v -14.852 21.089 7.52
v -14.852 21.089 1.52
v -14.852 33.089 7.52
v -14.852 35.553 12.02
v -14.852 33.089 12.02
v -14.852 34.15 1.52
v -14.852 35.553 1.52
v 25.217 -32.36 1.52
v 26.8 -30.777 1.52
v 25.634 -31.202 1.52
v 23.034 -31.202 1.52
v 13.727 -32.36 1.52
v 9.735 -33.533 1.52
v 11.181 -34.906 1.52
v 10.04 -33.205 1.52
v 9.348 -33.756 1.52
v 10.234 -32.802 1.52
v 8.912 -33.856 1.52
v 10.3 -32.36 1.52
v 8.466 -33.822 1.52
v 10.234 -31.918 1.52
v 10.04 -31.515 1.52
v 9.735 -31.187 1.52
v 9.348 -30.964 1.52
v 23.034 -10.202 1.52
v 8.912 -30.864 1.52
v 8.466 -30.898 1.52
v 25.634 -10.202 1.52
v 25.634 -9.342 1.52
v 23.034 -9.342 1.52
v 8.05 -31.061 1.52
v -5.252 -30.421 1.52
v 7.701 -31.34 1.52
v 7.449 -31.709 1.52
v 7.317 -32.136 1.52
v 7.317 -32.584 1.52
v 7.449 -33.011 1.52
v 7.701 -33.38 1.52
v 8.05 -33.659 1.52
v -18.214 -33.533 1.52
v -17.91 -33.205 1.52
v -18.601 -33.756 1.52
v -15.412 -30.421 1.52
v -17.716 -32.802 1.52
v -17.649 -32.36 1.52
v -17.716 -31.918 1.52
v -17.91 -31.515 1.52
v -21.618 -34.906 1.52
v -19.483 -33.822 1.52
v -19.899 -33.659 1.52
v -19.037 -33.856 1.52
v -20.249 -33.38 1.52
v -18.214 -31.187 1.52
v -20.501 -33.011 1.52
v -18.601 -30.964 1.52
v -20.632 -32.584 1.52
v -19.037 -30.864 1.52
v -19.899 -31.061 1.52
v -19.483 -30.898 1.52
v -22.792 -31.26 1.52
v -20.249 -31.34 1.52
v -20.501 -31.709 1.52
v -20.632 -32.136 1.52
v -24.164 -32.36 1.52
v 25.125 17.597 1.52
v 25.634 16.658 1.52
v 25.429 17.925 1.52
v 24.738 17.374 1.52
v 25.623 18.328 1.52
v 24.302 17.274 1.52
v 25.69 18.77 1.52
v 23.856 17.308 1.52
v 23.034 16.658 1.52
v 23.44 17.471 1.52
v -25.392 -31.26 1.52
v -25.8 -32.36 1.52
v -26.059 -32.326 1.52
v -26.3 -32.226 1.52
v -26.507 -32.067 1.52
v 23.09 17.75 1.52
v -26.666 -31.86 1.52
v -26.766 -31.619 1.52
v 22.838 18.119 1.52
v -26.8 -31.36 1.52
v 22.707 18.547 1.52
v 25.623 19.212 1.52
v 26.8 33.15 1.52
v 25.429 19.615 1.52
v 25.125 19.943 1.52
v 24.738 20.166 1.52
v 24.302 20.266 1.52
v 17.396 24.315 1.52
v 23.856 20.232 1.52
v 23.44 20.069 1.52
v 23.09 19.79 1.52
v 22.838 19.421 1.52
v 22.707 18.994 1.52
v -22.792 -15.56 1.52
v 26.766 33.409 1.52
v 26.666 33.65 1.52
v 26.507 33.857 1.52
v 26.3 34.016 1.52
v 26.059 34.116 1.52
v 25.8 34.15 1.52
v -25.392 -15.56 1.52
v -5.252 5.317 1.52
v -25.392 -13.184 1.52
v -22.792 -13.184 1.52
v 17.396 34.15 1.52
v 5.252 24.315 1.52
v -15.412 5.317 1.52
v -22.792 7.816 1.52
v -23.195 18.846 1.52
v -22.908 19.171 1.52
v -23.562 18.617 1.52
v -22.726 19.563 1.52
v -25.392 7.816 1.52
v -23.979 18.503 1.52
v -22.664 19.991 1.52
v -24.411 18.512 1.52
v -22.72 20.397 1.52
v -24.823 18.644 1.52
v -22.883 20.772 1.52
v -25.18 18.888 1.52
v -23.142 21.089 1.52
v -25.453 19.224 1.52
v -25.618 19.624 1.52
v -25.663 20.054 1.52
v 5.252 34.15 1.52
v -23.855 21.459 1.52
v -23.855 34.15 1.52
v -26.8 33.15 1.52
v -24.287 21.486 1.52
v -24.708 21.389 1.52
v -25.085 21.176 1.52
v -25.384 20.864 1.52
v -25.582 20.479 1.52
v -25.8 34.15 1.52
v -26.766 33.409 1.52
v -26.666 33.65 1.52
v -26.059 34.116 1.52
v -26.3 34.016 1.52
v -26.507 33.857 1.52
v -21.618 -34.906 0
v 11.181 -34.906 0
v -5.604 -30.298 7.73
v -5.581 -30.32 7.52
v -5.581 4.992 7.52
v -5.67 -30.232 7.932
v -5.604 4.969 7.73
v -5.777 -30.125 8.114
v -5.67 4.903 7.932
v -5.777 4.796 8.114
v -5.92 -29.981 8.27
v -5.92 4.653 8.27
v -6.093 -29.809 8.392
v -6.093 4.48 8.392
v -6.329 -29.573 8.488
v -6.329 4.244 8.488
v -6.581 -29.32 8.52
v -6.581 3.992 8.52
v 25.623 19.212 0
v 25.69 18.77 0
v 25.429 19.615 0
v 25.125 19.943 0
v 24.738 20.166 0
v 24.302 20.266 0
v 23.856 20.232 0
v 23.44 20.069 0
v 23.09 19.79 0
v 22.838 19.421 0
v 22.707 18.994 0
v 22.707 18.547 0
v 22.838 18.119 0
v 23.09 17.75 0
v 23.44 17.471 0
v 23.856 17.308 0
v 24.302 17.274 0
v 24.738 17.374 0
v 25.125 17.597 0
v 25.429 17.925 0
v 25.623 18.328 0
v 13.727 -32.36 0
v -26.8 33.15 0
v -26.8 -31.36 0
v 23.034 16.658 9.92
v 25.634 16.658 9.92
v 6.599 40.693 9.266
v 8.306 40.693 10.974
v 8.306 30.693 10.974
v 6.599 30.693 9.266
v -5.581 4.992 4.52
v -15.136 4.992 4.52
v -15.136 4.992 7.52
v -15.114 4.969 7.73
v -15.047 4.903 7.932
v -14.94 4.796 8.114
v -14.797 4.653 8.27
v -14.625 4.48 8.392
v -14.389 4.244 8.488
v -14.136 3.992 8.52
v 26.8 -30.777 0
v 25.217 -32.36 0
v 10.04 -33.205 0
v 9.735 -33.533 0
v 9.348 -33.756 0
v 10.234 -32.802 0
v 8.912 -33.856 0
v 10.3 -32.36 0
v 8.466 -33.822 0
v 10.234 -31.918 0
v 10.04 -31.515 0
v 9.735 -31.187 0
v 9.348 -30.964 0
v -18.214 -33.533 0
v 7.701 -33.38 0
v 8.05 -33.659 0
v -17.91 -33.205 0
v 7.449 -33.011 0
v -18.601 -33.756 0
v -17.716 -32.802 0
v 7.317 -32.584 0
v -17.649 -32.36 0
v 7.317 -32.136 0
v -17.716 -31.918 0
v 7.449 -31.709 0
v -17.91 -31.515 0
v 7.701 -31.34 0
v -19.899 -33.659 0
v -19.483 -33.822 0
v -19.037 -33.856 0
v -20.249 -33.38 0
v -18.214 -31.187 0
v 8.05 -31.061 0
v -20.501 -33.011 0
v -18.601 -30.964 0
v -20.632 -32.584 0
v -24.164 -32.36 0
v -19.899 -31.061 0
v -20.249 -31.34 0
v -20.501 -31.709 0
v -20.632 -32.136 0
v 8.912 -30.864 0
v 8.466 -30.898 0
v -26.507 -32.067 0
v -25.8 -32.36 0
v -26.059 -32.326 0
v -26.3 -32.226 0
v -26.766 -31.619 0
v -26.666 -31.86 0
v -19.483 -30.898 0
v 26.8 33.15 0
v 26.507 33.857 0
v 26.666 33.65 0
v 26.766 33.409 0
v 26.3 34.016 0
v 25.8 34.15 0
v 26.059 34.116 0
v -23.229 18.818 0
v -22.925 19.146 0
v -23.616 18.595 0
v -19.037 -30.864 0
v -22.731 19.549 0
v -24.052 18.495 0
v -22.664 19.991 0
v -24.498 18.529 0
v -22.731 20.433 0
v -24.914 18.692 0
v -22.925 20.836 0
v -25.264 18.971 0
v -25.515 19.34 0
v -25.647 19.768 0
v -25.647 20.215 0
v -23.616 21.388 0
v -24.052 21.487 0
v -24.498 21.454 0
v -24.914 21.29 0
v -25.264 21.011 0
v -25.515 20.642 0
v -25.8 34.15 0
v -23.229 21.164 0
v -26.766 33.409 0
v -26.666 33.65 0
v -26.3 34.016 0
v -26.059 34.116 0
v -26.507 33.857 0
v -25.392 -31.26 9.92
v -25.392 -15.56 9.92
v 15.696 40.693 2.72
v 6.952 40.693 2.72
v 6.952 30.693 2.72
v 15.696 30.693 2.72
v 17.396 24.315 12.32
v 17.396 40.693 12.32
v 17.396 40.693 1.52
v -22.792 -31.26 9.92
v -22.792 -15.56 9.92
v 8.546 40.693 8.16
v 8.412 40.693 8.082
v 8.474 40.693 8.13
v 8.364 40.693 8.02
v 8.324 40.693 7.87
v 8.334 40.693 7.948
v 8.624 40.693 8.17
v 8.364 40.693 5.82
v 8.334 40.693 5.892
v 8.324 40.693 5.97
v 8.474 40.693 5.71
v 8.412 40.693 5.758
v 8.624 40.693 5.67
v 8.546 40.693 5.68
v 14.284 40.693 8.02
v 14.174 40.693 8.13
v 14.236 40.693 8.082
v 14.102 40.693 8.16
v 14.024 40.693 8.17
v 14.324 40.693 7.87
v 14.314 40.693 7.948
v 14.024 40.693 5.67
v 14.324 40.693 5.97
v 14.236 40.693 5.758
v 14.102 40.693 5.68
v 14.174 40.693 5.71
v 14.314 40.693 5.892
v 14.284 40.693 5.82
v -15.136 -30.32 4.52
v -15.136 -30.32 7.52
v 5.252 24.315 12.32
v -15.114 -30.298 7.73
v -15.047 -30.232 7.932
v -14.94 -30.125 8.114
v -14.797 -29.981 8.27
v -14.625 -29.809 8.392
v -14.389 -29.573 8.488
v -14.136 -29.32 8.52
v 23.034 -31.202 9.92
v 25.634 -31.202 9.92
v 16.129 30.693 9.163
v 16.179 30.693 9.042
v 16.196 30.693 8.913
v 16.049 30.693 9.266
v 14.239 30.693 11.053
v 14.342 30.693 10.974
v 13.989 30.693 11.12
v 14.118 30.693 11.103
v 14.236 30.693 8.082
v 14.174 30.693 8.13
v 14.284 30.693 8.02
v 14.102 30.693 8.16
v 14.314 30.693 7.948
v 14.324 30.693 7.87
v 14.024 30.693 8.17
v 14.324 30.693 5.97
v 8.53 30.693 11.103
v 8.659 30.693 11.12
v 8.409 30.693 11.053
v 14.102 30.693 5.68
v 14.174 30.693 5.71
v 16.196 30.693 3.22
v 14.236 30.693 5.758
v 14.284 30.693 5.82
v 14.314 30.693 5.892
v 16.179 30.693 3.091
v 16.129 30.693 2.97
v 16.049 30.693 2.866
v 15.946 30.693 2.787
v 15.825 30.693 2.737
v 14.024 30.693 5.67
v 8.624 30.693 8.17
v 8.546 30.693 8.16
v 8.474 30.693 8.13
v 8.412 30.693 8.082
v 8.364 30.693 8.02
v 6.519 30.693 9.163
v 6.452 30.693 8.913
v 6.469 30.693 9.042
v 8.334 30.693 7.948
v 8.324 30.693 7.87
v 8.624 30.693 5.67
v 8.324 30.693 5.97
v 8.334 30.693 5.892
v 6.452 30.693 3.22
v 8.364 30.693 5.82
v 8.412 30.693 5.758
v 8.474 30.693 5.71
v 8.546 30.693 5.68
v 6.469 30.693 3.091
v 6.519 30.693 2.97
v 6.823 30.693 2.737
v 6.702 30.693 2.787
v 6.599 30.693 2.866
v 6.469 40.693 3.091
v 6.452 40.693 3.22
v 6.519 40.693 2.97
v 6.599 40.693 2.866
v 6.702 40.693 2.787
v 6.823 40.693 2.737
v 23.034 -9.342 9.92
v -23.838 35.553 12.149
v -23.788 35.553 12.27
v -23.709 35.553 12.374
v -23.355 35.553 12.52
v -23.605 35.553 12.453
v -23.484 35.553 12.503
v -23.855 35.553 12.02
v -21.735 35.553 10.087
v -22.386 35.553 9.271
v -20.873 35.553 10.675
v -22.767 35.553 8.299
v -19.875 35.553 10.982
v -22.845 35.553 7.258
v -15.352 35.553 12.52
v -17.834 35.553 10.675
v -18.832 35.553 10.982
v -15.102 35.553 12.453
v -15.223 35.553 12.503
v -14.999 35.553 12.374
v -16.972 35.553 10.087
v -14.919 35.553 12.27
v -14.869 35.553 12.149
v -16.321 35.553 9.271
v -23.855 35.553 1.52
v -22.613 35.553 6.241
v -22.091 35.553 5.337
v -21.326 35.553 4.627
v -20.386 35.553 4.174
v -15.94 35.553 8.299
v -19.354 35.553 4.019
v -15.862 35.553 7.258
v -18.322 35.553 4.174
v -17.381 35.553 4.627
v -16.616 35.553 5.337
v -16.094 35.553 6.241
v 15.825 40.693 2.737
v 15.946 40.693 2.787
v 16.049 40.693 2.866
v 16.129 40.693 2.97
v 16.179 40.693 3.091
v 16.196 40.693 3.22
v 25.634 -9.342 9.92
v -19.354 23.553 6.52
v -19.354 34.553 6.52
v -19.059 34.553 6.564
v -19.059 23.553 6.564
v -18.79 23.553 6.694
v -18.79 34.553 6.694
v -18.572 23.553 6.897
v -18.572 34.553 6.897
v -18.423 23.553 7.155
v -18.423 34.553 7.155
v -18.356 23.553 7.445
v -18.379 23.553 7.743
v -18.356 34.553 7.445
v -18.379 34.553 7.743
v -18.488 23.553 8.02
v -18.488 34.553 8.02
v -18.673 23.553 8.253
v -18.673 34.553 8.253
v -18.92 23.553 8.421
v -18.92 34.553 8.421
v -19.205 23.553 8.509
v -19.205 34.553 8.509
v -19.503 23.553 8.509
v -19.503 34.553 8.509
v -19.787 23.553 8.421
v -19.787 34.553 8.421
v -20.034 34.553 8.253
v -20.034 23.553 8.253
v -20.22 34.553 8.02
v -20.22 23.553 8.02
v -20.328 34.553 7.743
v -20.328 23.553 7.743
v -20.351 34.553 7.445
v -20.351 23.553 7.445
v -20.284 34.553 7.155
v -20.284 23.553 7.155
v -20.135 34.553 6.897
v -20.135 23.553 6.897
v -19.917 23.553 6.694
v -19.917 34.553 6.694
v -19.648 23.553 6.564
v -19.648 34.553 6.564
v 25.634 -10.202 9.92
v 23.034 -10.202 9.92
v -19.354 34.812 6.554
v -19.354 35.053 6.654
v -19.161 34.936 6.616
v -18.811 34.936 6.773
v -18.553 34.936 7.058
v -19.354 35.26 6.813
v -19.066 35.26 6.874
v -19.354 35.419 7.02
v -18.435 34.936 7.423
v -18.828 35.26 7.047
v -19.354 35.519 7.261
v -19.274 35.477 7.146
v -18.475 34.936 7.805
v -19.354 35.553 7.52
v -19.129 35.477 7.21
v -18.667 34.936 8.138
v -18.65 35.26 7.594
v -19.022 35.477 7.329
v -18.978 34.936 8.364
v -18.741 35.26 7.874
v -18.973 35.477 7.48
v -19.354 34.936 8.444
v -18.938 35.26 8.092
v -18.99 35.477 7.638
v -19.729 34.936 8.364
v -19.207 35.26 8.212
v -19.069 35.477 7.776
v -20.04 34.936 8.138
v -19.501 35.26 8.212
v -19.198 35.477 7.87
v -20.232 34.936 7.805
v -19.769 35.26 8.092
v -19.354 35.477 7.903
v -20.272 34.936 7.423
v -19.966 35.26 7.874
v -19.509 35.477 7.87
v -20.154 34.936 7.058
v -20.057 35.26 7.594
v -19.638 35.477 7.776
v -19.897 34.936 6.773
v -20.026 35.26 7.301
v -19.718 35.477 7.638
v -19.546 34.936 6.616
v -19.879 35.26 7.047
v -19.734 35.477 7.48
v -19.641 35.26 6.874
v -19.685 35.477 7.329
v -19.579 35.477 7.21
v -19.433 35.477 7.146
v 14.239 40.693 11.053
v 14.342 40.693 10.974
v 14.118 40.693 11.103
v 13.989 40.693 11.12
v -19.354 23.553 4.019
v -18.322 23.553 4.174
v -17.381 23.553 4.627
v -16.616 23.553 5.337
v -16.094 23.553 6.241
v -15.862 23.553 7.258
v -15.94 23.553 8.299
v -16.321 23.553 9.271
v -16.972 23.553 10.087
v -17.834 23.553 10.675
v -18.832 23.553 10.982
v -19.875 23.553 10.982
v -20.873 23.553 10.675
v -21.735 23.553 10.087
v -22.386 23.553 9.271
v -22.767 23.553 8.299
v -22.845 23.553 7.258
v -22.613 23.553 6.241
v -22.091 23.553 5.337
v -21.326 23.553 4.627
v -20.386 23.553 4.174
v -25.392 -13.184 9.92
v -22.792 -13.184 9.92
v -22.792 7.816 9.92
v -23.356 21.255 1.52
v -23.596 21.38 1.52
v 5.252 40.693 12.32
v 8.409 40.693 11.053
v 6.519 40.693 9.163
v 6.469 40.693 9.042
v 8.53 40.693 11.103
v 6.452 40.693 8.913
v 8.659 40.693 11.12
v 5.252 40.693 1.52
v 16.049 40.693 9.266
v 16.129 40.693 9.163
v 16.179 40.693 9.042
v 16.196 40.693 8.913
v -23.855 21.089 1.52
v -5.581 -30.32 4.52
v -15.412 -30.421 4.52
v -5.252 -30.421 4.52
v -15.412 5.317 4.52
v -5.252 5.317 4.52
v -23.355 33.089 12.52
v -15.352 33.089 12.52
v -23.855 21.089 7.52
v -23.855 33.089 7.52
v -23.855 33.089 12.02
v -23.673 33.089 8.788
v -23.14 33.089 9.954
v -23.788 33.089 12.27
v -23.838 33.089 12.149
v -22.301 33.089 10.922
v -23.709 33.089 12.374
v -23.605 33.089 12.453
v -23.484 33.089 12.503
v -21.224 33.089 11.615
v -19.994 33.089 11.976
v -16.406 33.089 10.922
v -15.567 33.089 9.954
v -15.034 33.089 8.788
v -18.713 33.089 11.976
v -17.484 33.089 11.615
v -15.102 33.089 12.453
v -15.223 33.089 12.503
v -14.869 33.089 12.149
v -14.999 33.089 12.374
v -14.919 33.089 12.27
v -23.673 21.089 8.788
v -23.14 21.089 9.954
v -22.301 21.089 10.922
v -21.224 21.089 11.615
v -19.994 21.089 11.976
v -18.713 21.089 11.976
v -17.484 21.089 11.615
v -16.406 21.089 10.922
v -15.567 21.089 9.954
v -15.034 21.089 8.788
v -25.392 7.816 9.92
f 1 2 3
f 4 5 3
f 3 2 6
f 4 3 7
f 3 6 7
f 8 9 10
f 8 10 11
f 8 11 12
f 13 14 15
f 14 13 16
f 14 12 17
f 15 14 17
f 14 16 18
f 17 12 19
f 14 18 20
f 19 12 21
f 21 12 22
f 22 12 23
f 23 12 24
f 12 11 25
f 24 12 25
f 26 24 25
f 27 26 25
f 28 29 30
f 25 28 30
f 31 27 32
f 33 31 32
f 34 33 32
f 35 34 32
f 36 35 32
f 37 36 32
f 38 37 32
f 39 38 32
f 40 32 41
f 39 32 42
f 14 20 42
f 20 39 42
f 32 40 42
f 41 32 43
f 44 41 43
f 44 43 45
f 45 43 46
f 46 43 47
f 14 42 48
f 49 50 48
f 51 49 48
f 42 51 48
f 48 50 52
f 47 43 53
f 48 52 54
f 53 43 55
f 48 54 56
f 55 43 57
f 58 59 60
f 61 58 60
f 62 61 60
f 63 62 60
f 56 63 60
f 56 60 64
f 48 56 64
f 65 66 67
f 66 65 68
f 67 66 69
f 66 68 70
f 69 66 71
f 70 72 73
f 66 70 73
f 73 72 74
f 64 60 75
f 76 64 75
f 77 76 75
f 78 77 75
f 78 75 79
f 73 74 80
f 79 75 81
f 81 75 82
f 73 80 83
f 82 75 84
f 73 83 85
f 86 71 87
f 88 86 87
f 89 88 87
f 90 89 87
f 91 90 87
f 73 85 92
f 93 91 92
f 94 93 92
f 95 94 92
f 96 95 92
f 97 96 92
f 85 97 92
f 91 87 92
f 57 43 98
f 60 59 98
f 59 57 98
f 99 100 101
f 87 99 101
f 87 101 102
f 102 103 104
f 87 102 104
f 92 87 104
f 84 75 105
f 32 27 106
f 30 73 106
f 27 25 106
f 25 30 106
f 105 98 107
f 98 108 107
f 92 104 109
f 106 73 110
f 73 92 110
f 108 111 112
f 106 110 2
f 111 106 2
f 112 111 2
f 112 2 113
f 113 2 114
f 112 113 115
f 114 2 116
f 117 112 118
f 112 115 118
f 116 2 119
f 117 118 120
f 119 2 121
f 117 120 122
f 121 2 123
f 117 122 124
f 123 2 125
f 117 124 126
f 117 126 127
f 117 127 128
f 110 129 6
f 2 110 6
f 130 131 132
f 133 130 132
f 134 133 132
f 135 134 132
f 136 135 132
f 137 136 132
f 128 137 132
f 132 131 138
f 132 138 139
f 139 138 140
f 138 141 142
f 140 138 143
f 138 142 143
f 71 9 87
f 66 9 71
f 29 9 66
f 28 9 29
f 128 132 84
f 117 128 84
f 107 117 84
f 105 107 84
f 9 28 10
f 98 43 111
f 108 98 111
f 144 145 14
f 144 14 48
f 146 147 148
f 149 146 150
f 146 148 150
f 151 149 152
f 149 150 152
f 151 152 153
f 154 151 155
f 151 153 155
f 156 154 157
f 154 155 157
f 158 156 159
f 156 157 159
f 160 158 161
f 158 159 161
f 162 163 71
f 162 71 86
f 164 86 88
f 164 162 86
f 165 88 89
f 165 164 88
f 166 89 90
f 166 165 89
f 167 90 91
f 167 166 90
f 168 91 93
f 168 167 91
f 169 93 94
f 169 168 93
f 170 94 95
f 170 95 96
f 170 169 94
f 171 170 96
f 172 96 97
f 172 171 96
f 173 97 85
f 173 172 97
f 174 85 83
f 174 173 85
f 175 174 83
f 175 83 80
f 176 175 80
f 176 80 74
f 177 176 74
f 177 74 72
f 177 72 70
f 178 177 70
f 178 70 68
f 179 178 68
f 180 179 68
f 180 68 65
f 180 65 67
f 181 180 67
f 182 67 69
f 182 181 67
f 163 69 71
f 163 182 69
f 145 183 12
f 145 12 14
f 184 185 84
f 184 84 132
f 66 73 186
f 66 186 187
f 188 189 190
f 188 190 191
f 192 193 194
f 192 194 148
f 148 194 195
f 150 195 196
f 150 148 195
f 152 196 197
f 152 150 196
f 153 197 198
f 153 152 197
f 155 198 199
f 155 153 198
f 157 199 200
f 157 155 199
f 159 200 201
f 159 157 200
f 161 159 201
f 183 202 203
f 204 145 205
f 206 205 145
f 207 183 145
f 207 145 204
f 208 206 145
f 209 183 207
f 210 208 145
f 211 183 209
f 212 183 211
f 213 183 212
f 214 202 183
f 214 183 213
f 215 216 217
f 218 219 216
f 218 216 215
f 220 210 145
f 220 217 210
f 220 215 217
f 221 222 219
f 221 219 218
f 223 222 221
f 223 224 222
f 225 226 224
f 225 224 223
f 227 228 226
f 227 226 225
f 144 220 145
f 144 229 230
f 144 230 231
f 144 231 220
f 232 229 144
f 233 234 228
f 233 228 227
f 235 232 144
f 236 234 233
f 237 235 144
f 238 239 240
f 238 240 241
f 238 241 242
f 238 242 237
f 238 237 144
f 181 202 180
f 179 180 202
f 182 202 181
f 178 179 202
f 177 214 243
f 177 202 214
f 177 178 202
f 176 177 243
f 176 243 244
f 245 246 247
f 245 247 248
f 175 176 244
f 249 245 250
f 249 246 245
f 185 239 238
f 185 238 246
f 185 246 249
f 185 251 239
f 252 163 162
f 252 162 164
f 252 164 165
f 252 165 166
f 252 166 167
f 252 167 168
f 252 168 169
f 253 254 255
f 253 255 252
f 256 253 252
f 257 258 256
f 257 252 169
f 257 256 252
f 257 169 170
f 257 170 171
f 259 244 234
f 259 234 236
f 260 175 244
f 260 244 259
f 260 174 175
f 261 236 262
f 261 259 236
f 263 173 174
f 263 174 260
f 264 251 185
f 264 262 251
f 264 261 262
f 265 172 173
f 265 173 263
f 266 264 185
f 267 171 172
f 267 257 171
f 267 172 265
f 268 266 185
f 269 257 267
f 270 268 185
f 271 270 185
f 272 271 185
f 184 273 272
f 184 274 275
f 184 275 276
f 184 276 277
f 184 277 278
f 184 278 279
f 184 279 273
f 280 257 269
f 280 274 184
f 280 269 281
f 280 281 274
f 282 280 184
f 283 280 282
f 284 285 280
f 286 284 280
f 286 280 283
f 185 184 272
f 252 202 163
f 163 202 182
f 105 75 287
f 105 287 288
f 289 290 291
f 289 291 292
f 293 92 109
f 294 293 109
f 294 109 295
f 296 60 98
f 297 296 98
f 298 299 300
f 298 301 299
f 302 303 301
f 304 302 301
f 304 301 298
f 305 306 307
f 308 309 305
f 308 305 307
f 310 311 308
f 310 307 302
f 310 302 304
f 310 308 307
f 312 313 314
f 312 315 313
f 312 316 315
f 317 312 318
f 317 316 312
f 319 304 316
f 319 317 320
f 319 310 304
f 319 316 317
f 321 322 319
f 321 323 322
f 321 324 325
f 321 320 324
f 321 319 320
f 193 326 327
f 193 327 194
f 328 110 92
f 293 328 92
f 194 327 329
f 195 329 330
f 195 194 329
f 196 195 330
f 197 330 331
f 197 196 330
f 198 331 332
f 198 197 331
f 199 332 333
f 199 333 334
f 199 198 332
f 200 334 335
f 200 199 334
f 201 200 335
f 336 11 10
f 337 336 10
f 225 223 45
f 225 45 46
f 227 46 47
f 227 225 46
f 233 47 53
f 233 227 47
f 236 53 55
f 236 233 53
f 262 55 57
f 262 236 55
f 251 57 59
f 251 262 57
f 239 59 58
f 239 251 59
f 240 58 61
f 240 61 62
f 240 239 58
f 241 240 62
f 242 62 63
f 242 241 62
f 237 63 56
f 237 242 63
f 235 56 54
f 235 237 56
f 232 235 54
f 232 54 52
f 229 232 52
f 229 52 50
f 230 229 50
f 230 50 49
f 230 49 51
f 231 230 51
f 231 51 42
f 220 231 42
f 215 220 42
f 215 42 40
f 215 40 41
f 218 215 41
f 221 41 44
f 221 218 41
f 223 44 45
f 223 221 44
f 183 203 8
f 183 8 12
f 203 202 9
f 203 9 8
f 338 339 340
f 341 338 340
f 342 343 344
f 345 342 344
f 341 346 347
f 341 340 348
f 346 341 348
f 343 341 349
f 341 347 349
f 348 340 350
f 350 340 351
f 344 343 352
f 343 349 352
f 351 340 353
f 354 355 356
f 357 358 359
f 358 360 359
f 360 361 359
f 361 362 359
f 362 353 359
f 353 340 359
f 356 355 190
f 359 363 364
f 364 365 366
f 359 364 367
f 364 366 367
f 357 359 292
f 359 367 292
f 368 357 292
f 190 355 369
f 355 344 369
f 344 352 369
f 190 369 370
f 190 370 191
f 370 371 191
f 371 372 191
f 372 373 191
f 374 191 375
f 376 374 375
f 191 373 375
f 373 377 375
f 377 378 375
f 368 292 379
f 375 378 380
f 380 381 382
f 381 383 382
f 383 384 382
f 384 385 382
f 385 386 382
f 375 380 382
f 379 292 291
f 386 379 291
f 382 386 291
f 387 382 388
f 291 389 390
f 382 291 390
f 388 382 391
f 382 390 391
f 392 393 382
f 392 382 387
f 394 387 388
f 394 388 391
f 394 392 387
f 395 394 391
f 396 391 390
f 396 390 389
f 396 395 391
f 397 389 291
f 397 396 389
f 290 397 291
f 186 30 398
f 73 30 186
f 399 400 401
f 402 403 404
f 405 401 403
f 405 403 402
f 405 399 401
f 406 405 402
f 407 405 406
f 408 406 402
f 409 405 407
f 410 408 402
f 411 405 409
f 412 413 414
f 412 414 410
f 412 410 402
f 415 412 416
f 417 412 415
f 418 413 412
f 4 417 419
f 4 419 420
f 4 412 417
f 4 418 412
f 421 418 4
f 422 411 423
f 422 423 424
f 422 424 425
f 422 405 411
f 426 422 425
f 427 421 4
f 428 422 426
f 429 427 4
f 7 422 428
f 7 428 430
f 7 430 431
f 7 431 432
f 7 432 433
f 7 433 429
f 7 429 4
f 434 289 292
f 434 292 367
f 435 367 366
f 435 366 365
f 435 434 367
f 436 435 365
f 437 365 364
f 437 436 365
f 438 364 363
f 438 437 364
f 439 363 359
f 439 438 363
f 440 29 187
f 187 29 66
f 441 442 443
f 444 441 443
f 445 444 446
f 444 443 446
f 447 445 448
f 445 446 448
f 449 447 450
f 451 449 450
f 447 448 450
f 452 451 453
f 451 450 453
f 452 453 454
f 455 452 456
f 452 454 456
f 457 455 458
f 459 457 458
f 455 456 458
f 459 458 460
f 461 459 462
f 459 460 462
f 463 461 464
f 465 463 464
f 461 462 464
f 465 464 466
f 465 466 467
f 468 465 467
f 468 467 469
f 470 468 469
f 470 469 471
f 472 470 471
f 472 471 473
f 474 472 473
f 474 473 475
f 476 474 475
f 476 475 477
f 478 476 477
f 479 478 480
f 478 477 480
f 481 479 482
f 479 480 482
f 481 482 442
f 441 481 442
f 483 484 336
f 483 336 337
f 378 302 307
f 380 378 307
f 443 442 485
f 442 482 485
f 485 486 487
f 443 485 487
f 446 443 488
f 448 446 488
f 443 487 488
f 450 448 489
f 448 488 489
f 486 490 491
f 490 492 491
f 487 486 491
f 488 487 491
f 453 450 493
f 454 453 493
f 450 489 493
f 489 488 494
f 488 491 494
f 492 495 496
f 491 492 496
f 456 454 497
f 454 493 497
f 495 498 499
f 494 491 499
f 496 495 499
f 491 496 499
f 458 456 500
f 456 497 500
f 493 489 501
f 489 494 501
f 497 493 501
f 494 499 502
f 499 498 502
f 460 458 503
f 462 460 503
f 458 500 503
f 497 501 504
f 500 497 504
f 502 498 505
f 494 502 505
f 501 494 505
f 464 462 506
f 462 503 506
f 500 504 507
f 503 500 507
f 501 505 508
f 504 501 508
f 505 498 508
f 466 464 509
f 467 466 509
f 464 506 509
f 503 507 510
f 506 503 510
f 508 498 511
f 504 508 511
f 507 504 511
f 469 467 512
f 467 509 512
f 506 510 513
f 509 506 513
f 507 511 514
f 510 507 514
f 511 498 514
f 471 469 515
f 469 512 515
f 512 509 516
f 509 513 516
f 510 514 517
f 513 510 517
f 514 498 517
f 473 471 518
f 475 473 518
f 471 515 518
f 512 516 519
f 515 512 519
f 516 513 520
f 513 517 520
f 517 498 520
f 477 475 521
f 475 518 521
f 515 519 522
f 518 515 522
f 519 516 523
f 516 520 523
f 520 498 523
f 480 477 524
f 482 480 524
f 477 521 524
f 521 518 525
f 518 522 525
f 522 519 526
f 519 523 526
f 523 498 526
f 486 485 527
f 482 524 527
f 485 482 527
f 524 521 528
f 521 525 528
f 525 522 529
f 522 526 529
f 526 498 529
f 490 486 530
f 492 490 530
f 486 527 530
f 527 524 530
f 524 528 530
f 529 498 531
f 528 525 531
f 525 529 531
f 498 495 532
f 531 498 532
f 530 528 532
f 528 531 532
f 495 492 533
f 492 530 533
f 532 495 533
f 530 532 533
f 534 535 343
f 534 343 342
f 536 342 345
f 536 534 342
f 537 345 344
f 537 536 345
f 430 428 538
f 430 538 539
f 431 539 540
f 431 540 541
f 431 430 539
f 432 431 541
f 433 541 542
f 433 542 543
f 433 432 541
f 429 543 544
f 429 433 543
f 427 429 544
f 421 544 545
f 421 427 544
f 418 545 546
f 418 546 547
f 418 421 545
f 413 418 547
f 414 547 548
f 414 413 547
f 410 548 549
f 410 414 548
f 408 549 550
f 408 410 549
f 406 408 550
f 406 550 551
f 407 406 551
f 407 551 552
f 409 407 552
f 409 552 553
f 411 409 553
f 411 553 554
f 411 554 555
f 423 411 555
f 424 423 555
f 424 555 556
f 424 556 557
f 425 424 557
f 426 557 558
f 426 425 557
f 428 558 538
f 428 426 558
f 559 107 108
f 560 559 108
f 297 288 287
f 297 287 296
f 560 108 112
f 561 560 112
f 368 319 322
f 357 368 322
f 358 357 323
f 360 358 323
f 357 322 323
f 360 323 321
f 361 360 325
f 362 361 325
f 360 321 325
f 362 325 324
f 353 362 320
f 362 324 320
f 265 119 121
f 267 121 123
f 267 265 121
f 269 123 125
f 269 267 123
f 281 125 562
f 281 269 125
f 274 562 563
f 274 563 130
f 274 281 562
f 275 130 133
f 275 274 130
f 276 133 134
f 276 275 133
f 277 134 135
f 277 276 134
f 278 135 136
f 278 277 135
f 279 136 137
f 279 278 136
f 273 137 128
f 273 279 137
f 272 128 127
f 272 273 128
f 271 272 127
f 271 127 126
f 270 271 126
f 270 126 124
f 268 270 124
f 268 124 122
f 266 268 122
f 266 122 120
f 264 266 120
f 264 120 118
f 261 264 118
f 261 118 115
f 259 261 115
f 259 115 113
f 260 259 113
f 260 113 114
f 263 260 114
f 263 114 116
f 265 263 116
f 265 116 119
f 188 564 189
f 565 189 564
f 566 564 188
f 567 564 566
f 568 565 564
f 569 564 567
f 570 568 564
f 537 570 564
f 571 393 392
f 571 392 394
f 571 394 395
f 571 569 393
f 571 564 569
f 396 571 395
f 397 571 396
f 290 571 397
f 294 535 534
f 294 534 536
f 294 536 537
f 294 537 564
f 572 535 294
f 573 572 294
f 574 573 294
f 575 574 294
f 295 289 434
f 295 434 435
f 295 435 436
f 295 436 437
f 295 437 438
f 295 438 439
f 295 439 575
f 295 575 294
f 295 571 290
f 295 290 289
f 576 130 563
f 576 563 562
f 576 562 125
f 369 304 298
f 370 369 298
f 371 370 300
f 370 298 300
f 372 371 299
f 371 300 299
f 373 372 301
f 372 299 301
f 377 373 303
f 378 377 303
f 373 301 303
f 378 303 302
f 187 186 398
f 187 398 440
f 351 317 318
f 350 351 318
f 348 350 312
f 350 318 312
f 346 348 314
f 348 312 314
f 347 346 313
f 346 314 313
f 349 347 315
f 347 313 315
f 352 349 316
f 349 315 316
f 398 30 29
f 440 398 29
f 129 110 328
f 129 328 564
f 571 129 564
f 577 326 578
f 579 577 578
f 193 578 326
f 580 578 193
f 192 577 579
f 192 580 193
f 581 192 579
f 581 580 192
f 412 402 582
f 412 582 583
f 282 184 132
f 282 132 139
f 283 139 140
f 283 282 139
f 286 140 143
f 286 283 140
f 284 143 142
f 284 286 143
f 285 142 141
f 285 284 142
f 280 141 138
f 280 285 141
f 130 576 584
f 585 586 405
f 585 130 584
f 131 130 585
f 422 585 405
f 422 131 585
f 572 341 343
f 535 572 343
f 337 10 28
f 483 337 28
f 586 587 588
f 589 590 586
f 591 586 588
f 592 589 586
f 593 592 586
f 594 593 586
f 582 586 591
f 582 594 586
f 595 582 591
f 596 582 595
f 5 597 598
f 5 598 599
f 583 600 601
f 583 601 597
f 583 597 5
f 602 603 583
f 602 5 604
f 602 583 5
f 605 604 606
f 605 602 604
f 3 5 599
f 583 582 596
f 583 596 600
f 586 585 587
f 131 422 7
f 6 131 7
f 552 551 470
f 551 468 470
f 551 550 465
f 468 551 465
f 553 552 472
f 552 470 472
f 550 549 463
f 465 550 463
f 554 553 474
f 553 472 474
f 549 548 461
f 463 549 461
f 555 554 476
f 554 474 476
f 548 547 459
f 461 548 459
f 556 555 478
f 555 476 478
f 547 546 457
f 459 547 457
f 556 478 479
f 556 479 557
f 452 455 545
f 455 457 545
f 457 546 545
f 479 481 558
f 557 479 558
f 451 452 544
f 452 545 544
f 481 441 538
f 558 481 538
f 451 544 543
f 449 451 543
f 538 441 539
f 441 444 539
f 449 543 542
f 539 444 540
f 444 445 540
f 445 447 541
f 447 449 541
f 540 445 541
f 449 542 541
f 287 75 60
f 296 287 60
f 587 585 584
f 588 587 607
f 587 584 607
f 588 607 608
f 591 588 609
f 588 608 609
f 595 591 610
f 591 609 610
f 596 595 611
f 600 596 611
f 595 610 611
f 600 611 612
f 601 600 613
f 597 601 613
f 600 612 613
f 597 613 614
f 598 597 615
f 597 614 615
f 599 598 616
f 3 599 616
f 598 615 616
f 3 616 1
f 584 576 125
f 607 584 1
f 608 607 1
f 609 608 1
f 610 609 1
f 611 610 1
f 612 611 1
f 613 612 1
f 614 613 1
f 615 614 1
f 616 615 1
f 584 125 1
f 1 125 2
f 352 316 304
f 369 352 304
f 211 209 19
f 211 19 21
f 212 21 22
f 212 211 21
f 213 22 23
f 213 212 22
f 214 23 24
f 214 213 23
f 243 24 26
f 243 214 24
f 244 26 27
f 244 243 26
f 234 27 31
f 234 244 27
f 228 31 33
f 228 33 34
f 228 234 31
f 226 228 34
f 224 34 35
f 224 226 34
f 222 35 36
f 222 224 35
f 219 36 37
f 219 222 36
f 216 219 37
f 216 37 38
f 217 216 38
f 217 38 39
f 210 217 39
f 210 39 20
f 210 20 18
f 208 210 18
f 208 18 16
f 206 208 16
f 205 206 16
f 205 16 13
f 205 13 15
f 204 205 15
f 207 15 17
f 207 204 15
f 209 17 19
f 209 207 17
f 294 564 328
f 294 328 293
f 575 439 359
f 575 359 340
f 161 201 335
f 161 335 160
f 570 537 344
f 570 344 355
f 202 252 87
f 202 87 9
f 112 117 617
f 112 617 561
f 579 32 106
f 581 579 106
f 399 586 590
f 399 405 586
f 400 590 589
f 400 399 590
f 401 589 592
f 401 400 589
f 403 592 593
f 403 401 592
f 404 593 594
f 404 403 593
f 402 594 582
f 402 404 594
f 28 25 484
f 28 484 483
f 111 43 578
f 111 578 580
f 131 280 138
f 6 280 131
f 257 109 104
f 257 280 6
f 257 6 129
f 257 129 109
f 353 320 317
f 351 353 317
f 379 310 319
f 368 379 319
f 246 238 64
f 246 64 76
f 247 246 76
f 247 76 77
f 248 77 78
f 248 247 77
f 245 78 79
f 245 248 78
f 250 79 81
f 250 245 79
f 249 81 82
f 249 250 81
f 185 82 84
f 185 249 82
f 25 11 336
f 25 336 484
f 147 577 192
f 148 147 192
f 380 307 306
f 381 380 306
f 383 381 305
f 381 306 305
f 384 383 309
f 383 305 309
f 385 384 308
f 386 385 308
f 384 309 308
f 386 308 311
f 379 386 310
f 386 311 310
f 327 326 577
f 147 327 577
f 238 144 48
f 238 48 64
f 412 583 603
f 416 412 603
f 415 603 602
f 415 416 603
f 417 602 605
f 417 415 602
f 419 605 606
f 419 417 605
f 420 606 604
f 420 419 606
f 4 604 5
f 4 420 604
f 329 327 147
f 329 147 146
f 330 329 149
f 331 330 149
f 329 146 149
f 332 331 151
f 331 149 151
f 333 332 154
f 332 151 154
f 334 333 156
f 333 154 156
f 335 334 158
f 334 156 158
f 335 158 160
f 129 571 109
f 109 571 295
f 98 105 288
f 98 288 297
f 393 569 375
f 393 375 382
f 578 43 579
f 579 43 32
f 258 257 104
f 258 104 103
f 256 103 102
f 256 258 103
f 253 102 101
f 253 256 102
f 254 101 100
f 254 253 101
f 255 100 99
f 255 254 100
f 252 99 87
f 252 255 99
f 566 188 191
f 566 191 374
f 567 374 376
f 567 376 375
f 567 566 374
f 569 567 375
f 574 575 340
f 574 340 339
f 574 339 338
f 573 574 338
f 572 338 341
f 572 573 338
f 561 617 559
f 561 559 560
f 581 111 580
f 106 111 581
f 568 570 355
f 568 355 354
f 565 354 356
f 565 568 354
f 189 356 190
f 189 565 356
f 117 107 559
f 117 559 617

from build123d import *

# Parameters (mm, degrees)
ESBO_O2_R                = 1.5
RESSALTO_EXTRUS_O1_DEPTH = 1.52
ESBO_O3_W                = 9.002839431
ESBO_O3_H                = 14.464026403
RESSALTO_EXTRUS_O2_DEPTH = 11
ESBO_O4_W                = 2.6
ESBO_O4_H                = 21
ESBO_O4_H_2              = 26
ESBO_O4_H_3              = 15.7
RESSALTO_EXTRUS_O3_DEPTH = 8.4
CORTE_EXTRUS_O1_DEPTH    = 12
ESBO_O6_R                = 3.501419715
ESBO_O6_R_2              = 1
CORTE_EXTRUS_O2_DEPTH    = 12
FILETE1_R                = 1
FILETE2_R                = 0.5
ESBO_O7_W                = 12.143418905
ESBO_O7_H                = 16.377735741
RESSALTO_EXTRUS_O4_DEPTH = 10.8
CORTE_EXTRUS_O3_DEPTH    = 10
ESBO_O10_W               = 9.554785471
ESBO_O10_H               = 35.312042965
RESSALTO_EXTRUS_O5_DEPTH = 7
FILETE3_R                = 1
ESBO_O11_W               = 10.159902464
ESBO_O11_H               = 35.738148994
RESSALTO_EXTRUS_O6_DEPTH = 3


with BuildPart() as part:
    # Esboço2 → Ressalto-extrusão1 (new body)
    with BuildSketch(Plane.XY):
        with BuildLine():
            Line((26.8, -30.777402322), (25.217451408, -32.359950915))
            Line((25.217451408, -32.359950915), (13.7271729, -32.359950915))
            Line((13.7271729, -32.359950915), (11.181461411, -34.905662403))
            Line((11.181461411, -34.905662403), (-21.61825292, -34.905662403))
            Line((-21.61825292, -34.905662403), (-24.163964409, -32.359950915))
            Line((-24.163964409, -32.359950915), (-25.8, -32.359950915))
            ThreePointArc((-25.8, -32.359950915), (-26.507106781, -32.067057696), (-26.8, -31.359950915))
            Line((-26.8, -31.359950915), (-26.8, 33.15))
            ThreePointArc((-26.8, 33.15), (-26.507106781, 33.857106781), (-25.8, 34.15))
            Line((-25.8, 34.15), (25.8, 34.15))
            ThreePointArc((25.8, 34.15), (26.507106781, 33.857106781), (26.8, 33.15))
            Line((26.8, 33.15), (26.8, -30.777402322))
        make_face()
        with Locations((24.189792897, 18.770096718)):
            Circle(ESBO_O2_R, mode=Mode.SUBTRACT)
        with Locations((-24.163964409, 19.991194307)):
            Circle(ESBO_O2_R, mode=Mode.SUBTRACT)
        with Locations((-19.149057151, -32.359950915)):
            Circle(ESBO_O2_R, mode=Mode.SUBTRACT)
        with Locations((8.800152978, -32.359950915)):
            Circle(ESBO_O2_R, mode=Mode.SUBTRACT)
    extrude(amount=RESSALTO_EXTRUS_O1_DEPTH)

    # Esboço3 → Ressalto-extrusão2 (add)
    with BuildSketch(Plane.XY.offset(1.52)):
        with Locations((-19.353564393, 28.321014274)):
            Rectangle(ESBO_O3_W, ESBO_O3_H)
    extrude(amount=RESSALTO_EXTRUS_O2_DEPTH)

    # Esboço4 → Ressalto-extrusão3 (add)
    with BuildSketch(Plane.XY.offset(1.52)):
        with Locations((24.334460994, -20.701802403)):
            Rectangle(ESBO_O4_W, ESBO_O4_H)
        with Locations((24.334460994, 3.658197597)):
            Rectangle(ESBO_O4_W, ESBO_O4_H_2)
        with Locations((-24.092015344, -2.684387248)):
            Rectangle(ESBO_O4_W, ESBO_O4_H)
        with Locations((-24.092015344, -23.409860345)):
            Rectangle(ESBO_O4_W, ESBO_O4_H_3)
    extrude(amount=RESSALTO_EXTRUS_O3_DEPTH)

    # Esboço5 → Corte-extrusão1 (cut)
    with BuildSketch(Plane.XZ.offset(-21.089001072)):
        with BuildLine():
            Line((-14.852144677, 7.52), (-14.852144677, 12.52))
            Line((-14.852144677, 12.52), (-23.854984108, 12.52))
            Line((-23.854984108, 12.52), (-23.854984108, 7.52))
            ThreePointArc((-23.854984108, 7.52), (-19.353564393, 12.021419715), (-14.852144677, 7.52))
        make_face()
    extrude(amount=-CORTE_EXTRUS_O1_DEPTH, mode=Mode.SUBTRACT)

    # Esboço6 → Corte-extrusão2 (cut)
    with BuildSketch(Plane.XZ.offset(-35.553027475)):
        with Locations(Location((-19.353564393, 7.52, 0), (0, 0, 270))):
            Circle(ESBO_O6_R)
        with Locations(Location((-19.353564393, 7.52, 0), (0, 0, 270))):
            Circle(ESBO_O6_R_2, mode=Mode.SUBTRACT)
    extrude(amount=CORTE_EXTRUS_O2_DEPTH, mode=Mode.SUBTRACT)

    # Filete1
    filete1_edges = [part.edges().sort_by_distance(p)[0] for p in [
        (-19.353564393, 35.553027475, 8.52),
    ]]
    fillet(filete1_edges, radius=FILETE1_R)

    # Filete2
    filete2_edges = [part.edges().sort_by_distance(p)[0] for p in [
        (-14.852144677, 34.321014274, 12.52),
        (-23.854984108, 34.321014274, 12.52),
    ]]
    fillet(filete2_edges, radius=FILETE2_R)

    # Esboço7 → Ressalto-extrusão4 (add)
    with BuildSketch(Plane.XY.offset(1.52)):
        with Locations((11.324094847, 32.5040773)):
            Rectangle(ESBO_O7_W, ESBO_O7_H)
    extrude(amount=RESSALTO_EXTRUS_O4_DEPTH)

    # Esboço9 → Corte-extrusão3 (cut)
    with BuildSketch(Plane(origin=(0, 40.69294517, 0), x_dir=(1, 0, 0), z_dir=(0, 1, 0))):
        with BuildLine():
            Line((6.952385394, -2.72), (15.695804299, -2.72))
            ThreePointArc((15.695804299, -2.72), (16.04935769, -2.866446609), (16.195804299, -3.22))
            Line((16.195804299, -3.22), (16.195804299, -8.912893219))
            ThreePointArc((16.195804299, -8.912893219), (16.157744065, -9.104234935), (16.04935769, -9.266446609))
            Line((16.04935769, -9.266446609), (14.342250908, -10.973553391))
            ThreePointArc((14.342250908, -10.973553391), (14.180039234, -11.081939766), (13.988697518, -11.12))
            Line((13.988697518, -11.12), (8.659492175, -11.12))
            ThreePointArc((8.659492175, -11.12), (8.468150459, -11.081939766), (8.305938785, -10.973553391))
            Line((8.305938785, -10.973553391), (6.598832004, -9.266446609))
            ThreePointArc((6.598832004, -9.266446609), (6.490445628, -9.104234935), (6.452385394, -8.912893219))
            Line((6.452385394, -8.912893219), (6.452385394, -3.22))
            ThreePointArc((6.452385394, -3.22), (6.598832004, -2.866446609), (6.952385394, -2.72))
        make_face()
        with BuildLine():
            Line((14.024094847, -8.17), (8.624094847, -8.17))
            ThreePointArc((8.624094847, -8.17), (8.411962812, -8.082132034), (8.324094847, -7.87))
            Line((8.324094847, -7.87), (8.324094847, -5.97))
            ThreePointArc((8.324094847, -5.97), (8.411962812, -5.757867966), (8.624094847, -5.67))
            Line((8.624094847, -5.67), (14.024094847, -5.67))
            ThreePointArc((14.024094847, -5.67), (14.236226881, -5.757867966), (14.324094847, -5.97))
            Line((14.324094847, -5.97), (14.324094847, -7.87))
            ThreePointArc((14.324094847, -7.87), (14.236226881, -8.082132034), (14.024094847, -8.17))
        make_face(mode=Mode.SUBTRACT)
    extrude(amount=-CORTE_EXTRUS_O3_DEPTH, mode=Mode.SUBTRACT)

    # Esboço10 → Ressalto-extrusão5 (add)
    with BuildSketch(Plane.XY.offset(1.52)):
        with Locations((-10.358620196, -12.664154249)):
            Rectangle(ESBO_O10_W, ESBO_O10_H)
    extrude(amount=RESSALTO_EXTRUS_O5_DEPTH)

    # Filete3
    filete3_edges = [part.edges().sort_by_distance(p)[0] for p in [
        (-5.58122746, -12.664154249, 8.52),
        (-10.358620195, 4.991867234, 8.52),
        (-15.136012931, -12.664154249, 8.52),
        (-10.358620195, -30.320175731, 8.52),
    ]]
    fillet(filete3_edges, radius=FILETE3_R)

    # Esboço11 → Ressalto-extrusão6 (add)
    with BuildSketch(Plane.XY.offset(1.52)):
        with Locations((-10.332437347, -12.5521927)):
            Rectangle(ESBO_O11_W, ESBO_O11_H)
    extrude(amount=RESSALTO_EXTRUS_O6_DEPTH)


solid = part.part
